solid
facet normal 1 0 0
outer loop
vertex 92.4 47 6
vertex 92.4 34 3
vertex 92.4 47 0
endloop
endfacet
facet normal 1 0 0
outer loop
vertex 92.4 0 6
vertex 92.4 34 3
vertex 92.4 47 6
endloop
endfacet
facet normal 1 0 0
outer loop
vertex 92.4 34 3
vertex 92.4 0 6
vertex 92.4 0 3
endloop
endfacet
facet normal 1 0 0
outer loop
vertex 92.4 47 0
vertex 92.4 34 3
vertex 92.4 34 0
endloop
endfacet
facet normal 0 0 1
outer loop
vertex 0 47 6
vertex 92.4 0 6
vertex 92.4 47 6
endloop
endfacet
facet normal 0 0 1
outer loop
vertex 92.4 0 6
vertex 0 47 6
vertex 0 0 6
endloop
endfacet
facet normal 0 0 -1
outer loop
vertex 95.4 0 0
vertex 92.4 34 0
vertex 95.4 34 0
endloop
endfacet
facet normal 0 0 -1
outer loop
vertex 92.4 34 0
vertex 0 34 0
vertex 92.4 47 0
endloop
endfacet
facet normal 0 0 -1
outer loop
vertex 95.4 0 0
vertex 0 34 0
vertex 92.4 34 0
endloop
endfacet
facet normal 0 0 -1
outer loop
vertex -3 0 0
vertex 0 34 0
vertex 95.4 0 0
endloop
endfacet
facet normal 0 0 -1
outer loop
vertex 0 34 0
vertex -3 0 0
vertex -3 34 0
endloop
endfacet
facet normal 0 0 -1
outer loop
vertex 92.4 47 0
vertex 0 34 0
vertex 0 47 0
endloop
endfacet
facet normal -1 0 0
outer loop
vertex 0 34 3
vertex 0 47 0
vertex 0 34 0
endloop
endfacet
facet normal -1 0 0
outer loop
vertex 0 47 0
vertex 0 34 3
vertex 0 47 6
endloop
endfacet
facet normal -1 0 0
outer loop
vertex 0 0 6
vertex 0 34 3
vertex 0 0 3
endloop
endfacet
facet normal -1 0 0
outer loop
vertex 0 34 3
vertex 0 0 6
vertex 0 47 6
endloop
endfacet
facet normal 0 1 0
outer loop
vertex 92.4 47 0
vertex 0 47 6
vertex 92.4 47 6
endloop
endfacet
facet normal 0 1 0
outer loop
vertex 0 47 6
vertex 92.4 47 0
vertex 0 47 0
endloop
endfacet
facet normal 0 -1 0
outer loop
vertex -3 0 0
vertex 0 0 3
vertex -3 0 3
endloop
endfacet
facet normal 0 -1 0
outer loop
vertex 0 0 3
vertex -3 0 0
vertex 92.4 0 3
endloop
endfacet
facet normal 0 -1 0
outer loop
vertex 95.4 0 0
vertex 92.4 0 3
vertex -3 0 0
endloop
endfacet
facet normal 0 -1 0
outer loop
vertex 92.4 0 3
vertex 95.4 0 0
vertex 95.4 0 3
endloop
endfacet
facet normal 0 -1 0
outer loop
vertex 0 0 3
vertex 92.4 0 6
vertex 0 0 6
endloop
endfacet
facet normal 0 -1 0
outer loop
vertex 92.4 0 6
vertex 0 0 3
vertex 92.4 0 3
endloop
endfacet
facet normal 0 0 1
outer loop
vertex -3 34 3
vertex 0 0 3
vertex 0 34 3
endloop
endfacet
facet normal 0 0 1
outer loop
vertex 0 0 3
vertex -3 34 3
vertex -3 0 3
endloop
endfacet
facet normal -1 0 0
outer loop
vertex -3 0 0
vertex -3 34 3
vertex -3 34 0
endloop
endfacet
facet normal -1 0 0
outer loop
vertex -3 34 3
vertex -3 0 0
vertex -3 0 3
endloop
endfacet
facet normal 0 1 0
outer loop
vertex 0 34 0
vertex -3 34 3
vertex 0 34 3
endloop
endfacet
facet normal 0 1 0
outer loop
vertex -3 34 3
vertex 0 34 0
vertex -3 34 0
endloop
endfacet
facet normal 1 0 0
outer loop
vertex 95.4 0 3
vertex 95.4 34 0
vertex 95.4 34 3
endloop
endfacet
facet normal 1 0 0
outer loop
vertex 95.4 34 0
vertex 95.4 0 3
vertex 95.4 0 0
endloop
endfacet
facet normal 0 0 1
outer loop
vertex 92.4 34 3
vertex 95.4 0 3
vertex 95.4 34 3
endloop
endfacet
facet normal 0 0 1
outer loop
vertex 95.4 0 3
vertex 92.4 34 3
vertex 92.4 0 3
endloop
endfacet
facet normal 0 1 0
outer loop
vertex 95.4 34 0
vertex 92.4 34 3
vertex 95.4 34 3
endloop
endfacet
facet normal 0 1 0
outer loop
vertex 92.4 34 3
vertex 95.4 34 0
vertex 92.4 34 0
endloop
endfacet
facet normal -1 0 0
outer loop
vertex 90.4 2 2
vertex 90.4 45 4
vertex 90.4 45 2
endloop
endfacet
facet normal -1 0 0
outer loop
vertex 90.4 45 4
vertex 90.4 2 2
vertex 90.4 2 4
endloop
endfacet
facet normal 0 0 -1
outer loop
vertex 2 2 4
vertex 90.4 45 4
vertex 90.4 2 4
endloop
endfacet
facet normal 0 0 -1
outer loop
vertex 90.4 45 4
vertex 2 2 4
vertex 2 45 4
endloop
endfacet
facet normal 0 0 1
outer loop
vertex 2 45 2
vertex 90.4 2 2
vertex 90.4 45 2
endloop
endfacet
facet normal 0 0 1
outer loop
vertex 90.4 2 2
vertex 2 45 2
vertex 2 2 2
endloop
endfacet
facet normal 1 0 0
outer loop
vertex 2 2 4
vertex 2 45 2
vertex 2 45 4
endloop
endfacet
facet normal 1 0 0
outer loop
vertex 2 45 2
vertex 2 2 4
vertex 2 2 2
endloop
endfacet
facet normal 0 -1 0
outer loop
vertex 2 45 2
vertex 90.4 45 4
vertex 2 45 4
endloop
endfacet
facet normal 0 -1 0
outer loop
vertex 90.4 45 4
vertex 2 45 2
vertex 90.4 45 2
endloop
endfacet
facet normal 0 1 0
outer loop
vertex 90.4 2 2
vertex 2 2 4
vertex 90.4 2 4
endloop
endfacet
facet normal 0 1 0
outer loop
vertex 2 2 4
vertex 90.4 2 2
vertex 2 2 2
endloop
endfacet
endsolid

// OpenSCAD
$fn=200;
short_plate_depth=39.5;
long_plate_depth=43;
plate_height=3;
plate_width=92.4;
module plate() {
    difference() {
    union() {
        cube([ plate_width, long_plate_depth+4, 6 ] );
        translate([ -3, 0, 0 ]) cube([ 3, long_plate_depth-9, 3 ]);
        translate([ plate_width, 0, 0 ]) cube([ 3, long_plate_depth-9, 3 ]);
        }
        translate([ 2, 2, 2 ]) cube([ plate_width-4, long_plate_depth, 2 ]);
    }
    
    
    /*
    union() {
        cube([ plate_width, short_plate_depth-8, plate_height ]);
        translate([ 6, short_plate_depth-8, 0 ]) cube([plate_width-12, 8, 3]);
    }
        translate([-4, 3.5, 1.5]) rotate([0, 90, 0]) cylinder(h = 4, d = 3);
        translate([92.4, 3.5, 1.5]) rotate([0, 90, 0]) cylinder(h = 4, d = 3);
        translate([-4, 35.5, 1.5]) rotate([0, 90, 0]) cylinder(h = 10, d = 3);
        translate([86.4, 35.5, 1.5]) rotate([0, 90, 0]) cylinder(h = 10, d = 3);
 
/*     
    union() {
        translate([ 0, -50, 0 ]) cube([plate_width, long_plate_depth, plate_height]);
        translate([ 4, -56, 0 ]) cube([plate_width-8, 6, 3]);

        translate([-4.5, -53, 1.5]) rotate([0, 90, 0]) cylinder(h = 8.5, d = 3);
        translate([86.4, -53, 1.5]) rotate([0, 90, 0]) cylinder(h = 8.5, d = 3);
        translate([-4.5, -12, 1.5]) rotate([0, 90, 0]) cylinder(h = 4.5, d = 3);
        translate([90.4, -12, 1.5]) rotate([0, 90, 0]) cylinder(h = 4.5, d = 3);
    }
*/
}

guide_x1=0;
guide_y1=0;
guide_z1=0;
module spring_guide() {
    difference() {
        union() {
            translate([ guide_x1, guide_y1, guide_z1 ]) rotate([ 0, 0, 0 ]) cylinder( h = 3, r = 3.5, center=true );
 
            translate([ guide_x1+3, guide_y1, guide_z1 ]) rotate([ 0, 90, 0 ]) cylinder( h = 45, r = 1.5 );
        }
        translate([ guide_x1, guide_y1, guide_z1 ]) rotate([ 0, 0, 0 ]) cylinder( h = 3.1, r = 2, center = true );
    }
}

module spacer() {
        difference() {
        union() {
            translate([ 0, 0, 0 ]) rotate([ 0, 90, 180 ]) cylinder( h = 3, r = 3.5, center=true );
        }
        translate([ 1.5, 0, 0 ]) rotate([ 0, 90, 180 ]) cylinder( h = 3, r = 2 );
    }
}

module newplate() {
    polygon([ [0,1], [1,1] ]);
}

//newplate();
plate();
//spring_guide();
//spacer();
